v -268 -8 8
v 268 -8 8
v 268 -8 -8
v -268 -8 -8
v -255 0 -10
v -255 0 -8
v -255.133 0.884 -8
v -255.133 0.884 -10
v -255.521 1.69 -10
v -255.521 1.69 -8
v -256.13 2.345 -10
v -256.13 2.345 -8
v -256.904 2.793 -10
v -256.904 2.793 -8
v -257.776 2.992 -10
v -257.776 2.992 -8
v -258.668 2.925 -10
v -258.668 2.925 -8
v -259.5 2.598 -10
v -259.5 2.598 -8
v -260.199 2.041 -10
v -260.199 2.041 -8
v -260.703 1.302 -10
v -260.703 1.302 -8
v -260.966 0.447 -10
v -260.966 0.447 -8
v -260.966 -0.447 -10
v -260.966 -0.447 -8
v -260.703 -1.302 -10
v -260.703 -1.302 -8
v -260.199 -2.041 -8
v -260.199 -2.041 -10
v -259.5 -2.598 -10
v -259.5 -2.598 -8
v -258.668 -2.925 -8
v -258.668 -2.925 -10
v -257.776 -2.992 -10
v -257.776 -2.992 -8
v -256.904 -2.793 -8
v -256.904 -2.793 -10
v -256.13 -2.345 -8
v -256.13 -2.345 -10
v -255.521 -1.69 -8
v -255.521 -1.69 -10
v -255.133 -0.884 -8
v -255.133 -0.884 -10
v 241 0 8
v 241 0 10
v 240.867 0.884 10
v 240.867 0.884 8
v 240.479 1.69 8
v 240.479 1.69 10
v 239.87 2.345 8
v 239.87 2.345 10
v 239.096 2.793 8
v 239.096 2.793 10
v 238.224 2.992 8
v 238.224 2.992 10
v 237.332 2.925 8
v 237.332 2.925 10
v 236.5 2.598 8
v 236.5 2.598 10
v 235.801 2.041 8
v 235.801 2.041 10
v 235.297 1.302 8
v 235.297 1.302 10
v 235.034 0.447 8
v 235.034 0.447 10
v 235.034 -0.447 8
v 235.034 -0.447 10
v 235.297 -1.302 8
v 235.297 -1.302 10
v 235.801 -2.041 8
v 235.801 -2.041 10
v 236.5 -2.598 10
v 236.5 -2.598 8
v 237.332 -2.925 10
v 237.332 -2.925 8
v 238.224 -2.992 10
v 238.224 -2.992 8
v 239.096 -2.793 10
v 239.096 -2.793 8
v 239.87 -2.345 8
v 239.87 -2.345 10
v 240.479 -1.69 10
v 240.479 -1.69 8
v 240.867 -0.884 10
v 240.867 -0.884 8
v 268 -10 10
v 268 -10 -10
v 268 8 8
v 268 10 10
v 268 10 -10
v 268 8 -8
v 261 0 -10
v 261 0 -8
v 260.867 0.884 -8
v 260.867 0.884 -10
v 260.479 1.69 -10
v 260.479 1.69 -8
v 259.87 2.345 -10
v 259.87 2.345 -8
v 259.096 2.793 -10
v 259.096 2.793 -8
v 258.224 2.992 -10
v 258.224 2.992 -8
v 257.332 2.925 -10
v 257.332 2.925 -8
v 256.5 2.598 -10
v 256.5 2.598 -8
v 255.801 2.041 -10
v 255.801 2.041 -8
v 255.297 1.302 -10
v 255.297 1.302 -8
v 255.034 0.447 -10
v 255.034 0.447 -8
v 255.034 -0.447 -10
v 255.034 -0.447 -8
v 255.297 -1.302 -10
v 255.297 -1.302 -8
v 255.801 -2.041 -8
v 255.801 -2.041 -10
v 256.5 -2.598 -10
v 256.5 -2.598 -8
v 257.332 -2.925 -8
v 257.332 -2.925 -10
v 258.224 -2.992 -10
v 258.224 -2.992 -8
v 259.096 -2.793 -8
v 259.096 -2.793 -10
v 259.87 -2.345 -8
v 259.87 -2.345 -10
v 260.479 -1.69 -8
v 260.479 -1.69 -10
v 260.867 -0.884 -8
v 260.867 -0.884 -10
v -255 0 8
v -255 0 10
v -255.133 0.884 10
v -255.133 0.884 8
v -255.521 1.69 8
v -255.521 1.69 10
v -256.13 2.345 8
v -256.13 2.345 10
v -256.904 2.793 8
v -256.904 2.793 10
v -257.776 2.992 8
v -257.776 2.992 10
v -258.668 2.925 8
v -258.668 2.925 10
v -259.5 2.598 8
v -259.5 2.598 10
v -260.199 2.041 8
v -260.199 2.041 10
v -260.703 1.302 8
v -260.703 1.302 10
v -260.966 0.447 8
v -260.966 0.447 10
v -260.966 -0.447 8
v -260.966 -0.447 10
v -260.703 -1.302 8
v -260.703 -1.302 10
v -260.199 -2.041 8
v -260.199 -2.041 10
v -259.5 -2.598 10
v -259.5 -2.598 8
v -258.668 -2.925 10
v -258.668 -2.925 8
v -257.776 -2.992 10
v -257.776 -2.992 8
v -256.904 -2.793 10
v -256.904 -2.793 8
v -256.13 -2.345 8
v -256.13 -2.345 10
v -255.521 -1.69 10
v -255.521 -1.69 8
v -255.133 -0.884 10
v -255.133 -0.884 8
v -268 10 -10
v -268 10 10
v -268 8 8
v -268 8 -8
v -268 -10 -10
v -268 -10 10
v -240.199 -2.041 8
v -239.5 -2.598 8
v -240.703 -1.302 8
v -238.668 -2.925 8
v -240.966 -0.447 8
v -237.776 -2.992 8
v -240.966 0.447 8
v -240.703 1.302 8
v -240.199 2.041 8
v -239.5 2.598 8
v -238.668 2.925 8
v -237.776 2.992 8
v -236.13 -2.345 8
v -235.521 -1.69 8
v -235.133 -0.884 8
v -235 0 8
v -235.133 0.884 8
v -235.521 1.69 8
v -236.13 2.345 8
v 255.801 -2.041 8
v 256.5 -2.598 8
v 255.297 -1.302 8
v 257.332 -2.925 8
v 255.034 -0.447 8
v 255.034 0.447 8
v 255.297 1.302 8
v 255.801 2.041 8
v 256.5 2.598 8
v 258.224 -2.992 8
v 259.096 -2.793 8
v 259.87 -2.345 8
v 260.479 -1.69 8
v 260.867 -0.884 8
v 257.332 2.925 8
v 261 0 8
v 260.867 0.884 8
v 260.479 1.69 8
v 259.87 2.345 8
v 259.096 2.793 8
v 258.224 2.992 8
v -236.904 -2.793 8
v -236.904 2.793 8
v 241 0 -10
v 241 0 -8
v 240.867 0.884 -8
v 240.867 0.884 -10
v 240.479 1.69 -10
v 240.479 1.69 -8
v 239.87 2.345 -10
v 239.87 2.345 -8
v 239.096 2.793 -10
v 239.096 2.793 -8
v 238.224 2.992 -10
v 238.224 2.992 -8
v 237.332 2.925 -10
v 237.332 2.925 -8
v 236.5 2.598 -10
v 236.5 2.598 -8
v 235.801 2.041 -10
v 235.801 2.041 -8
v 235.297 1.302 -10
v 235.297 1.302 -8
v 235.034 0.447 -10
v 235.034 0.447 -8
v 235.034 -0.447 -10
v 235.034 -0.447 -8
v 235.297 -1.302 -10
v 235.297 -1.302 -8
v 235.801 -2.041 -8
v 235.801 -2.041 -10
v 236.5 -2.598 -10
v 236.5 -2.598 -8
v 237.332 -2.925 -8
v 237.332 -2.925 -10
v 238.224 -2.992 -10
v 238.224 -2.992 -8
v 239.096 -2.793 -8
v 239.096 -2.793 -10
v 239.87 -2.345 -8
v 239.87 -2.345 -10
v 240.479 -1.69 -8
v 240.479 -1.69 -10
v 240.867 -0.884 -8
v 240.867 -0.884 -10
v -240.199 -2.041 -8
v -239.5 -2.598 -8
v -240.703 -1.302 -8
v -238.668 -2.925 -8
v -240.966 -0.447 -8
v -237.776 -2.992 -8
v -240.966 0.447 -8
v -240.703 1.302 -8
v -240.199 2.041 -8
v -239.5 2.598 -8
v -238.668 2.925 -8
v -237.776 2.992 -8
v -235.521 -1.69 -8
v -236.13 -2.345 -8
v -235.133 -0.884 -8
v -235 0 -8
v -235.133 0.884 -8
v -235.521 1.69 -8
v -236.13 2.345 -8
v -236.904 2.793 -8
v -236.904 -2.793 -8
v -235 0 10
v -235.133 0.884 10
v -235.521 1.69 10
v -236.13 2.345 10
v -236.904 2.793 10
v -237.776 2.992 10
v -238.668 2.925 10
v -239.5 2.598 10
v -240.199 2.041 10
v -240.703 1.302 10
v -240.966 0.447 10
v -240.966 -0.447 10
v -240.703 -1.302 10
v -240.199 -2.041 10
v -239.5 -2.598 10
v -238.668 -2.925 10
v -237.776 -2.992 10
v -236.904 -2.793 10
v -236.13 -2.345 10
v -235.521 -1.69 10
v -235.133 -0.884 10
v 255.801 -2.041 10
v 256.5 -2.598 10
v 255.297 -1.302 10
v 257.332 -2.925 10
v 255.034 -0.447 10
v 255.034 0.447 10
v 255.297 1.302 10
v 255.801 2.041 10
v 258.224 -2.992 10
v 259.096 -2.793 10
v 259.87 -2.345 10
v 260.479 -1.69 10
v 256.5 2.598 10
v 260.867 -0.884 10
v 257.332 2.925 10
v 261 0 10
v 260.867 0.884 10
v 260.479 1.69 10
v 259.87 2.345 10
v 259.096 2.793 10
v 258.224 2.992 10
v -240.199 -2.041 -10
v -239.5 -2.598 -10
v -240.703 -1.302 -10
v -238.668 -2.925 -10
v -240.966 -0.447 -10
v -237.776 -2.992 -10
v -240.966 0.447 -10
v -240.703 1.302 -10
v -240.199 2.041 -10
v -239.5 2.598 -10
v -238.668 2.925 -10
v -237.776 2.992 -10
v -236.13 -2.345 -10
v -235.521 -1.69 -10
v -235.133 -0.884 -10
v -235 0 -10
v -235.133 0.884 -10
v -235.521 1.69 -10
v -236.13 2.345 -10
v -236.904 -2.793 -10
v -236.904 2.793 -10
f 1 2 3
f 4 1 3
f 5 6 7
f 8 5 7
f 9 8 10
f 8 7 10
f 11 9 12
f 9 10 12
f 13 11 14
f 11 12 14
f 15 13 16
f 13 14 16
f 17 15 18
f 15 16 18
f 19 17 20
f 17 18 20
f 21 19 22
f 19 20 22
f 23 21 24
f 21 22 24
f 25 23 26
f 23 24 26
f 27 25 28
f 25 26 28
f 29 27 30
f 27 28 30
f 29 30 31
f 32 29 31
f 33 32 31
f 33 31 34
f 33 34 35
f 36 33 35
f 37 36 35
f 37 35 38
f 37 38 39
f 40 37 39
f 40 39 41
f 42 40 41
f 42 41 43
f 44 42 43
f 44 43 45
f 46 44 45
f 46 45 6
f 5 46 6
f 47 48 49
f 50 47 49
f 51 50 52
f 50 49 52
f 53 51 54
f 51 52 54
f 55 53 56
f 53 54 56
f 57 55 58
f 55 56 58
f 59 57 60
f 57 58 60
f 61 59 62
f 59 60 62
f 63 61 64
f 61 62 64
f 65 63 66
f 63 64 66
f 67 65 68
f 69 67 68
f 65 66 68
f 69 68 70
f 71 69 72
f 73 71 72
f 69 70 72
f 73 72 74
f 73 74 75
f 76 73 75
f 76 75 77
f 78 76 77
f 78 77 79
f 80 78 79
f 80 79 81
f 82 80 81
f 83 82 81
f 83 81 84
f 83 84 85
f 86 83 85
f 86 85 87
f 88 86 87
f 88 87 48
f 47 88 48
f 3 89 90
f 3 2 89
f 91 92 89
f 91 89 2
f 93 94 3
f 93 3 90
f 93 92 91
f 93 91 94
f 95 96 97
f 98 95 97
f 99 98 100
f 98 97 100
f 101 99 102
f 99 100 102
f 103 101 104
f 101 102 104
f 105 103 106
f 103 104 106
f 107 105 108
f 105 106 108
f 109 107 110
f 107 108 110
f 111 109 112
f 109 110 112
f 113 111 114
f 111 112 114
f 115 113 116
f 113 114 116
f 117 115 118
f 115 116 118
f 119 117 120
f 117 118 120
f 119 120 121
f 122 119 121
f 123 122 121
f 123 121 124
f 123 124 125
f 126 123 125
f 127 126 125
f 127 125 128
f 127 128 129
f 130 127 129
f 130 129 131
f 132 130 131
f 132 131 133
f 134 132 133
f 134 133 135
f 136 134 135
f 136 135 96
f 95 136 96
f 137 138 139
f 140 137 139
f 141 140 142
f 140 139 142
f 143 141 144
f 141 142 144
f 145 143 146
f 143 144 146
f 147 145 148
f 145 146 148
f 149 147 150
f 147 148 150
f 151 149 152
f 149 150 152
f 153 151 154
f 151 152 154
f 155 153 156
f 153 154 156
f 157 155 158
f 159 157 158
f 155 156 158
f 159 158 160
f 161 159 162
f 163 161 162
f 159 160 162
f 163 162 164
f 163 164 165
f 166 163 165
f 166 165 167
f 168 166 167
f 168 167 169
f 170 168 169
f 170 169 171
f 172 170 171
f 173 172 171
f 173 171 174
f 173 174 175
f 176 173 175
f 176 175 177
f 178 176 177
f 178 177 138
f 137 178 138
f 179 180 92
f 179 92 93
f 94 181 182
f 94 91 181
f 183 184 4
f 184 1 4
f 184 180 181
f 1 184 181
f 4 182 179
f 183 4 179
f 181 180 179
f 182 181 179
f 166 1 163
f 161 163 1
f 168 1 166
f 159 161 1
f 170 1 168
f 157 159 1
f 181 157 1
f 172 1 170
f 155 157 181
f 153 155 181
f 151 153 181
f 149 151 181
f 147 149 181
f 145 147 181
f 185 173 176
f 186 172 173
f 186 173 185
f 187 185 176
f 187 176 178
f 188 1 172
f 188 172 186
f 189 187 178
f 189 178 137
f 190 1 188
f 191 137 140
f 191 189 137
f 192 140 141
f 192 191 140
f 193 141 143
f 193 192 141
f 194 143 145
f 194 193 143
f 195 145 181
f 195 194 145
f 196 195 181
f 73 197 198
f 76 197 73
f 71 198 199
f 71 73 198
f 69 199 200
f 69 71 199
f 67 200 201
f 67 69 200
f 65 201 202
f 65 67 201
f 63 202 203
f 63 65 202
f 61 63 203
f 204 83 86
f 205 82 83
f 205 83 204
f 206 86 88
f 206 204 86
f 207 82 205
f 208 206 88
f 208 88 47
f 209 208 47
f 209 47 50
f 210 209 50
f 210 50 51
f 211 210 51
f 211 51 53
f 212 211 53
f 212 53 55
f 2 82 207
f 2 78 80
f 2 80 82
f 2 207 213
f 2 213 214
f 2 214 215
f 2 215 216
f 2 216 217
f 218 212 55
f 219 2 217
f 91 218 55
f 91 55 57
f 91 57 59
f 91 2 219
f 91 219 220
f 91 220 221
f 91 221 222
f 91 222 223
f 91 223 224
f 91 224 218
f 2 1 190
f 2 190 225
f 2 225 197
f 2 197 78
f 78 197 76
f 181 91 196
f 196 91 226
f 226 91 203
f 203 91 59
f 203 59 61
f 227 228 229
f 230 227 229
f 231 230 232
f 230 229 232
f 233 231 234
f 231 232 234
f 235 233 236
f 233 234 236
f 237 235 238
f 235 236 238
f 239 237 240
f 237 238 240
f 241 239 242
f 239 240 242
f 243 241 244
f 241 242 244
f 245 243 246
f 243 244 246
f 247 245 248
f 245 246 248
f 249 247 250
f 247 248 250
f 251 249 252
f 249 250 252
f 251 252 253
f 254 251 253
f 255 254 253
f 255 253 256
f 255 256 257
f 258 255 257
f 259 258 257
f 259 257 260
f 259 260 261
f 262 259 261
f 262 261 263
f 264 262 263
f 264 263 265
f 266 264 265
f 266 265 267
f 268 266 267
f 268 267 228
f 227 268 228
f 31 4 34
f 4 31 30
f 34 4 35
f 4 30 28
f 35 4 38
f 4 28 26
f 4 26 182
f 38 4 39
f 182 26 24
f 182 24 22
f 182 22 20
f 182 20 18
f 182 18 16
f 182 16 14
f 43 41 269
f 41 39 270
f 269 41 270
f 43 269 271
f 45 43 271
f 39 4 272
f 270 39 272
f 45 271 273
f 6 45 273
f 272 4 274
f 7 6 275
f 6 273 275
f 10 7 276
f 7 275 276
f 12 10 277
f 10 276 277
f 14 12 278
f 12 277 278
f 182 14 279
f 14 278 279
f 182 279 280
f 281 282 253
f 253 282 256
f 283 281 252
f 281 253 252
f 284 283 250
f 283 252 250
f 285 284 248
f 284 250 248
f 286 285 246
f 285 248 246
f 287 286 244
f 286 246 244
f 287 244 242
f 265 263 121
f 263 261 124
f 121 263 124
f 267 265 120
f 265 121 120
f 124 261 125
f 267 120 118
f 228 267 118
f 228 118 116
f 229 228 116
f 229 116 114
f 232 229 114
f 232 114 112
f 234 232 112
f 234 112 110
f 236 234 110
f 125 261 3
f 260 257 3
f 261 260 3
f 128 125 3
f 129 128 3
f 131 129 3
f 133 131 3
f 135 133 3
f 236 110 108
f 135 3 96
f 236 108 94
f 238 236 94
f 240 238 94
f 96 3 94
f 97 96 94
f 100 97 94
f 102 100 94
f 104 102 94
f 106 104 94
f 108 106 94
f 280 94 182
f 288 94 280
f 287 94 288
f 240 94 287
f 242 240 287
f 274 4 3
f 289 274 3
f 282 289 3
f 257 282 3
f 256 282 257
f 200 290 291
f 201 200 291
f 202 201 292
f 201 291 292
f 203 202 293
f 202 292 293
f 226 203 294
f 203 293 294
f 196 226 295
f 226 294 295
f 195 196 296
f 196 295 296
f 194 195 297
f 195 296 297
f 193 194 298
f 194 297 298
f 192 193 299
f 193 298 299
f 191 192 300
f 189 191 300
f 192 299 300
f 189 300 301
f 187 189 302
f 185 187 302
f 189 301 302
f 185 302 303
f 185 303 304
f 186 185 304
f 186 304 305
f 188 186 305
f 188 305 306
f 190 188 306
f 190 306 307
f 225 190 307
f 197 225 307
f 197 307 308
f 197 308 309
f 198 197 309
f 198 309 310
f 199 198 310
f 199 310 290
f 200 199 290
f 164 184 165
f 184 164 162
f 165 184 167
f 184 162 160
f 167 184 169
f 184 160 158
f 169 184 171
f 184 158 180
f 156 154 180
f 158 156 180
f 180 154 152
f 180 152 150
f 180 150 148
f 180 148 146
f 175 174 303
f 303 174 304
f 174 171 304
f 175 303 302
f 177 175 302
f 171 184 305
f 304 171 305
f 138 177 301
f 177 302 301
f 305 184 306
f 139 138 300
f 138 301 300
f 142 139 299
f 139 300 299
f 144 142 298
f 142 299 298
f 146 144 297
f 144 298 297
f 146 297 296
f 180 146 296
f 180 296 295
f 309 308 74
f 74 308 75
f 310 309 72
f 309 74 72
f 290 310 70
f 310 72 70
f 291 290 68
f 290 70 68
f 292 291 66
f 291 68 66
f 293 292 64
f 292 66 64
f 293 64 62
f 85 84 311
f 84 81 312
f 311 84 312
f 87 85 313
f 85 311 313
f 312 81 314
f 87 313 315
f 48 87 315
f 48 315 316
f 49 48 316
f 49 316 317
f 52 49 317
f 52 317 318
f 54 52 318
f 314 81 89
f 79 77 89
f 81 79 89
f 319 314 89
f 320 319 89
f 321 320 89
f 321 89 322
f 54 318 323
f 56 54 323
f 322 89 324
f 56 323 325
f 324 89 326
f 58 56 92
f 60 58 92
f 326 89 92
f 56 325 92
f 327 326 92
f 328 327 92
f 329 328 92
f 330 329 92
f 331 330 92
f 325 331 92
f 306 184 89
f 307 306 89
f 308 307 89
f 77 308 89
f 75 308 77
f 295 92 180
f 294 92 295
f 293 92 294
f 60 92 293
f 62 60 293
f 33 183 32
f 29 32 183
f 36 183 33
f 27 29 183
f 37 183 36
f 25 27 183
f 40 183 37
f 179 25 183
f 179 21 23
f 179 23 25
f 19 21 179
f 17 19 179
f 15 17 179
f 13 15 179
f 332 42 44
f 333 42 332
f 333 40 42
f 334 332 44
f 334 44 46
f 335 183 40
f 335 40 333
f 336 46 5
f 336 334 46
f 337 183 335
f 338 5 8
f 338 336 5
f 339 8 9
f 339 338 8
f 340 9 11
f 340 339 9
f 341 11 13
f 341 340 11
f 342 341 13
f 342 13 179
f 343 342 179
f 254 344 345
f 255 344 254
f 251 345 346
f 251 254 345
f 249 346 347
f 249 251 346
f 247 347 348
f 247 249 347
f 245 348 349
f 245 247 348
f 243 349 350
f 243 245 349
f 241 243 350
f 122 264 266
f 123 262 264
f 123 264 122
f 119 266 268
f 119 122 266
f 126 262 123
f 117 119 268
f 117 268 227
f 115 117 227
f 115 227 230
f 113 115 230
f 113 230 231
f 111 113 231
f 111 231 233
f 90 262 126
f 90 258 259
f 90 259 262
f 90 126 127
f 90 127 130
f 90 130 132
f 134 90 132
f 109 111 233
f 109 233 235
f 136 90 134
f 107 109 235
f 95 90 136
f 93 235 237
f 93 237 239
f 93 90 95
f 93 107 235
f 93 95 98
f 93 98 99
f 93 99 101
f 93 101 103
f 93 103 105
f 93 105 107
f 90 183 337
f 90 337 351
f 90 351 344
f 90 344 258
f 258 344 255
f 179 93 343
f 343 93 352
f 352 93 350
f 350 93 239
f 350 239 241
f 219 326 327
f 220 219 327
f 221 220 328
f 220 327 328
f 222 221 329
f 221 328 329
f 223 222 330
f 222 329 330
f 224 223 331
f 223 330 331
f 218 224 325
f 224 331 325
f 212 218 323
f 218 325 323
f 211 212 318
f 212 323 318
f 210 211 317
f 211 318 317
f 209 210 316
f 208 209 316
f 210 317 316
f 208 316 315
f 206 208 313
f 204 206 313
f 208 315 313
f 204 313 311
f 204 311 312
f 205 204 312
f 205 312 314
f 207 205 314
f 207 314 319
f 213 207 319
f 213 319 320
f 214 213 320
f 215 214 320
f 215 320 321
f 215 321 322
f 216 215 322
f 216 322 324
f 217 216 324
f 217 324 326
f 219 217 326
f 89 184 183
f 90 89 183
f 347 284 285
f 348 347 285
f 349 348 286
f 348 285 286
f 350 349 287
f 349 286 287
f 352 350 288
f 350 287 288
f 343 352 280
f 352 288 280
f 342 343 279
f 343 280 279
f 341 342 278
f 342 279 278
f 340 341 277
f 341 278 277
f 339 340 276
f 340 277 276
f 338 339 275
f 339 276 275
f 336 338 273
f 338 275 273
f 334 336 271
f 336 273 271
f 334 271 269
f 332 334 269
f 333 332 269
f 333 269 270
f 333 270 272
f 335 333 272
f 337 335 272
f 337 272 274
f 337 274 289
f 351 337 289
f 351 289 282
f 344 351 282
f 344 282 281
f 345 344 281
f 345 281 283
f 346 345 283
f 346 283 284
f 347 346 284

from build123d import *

# Parameters (mm, degrees)
SKETCH1_W           = 20
SKETCH1_H           = 20
SKETCH1_W_2         = 16
SKETCH1_H_2         = 16
BOSS_EXTRUDE1_DEPTH = 268
SKETCH2_R           = 3
CUT_EXTRUDE1_DEPTH  = 269.931217972


with BuildPart() as part:
    # Sketch1 → Boss-Extrude1 (new, symmetric)
    with BuildSketch(Plane(origin=(0, 0, 0), x_dir=(0, 0, -1), z_dir=(1, 0, 0))):
        Rectangle(SKETCH1_W, SKETCH1_H)
        Rectangle(SKETCH1_W_2, SKETCH1_H_2, mode=Mode.SUBTRACT)
    extrude(amount=BOSS_EXTRUDE1_DEPTH, both=True)

    # Sketch2 → Cut-Extrude1 (cut, through all)
    with BuildSketch(Plane.XY.offset(10)):
        with Locations((258, 0)):
            Circle(SKETCH2_R)
        with Locations((238, 0)):
            Circle(SKETCH2_R)
        with Locations((-238, 0)):
            Circle(SKETCH2_R)
        with Locations((-258, 0)):
            Circle(SKETCH2_R)
    extrude(amount=-CUT_EXTRUDE1_DEPTH, mode=Mode.SUBTRACT)


solid = part.part
